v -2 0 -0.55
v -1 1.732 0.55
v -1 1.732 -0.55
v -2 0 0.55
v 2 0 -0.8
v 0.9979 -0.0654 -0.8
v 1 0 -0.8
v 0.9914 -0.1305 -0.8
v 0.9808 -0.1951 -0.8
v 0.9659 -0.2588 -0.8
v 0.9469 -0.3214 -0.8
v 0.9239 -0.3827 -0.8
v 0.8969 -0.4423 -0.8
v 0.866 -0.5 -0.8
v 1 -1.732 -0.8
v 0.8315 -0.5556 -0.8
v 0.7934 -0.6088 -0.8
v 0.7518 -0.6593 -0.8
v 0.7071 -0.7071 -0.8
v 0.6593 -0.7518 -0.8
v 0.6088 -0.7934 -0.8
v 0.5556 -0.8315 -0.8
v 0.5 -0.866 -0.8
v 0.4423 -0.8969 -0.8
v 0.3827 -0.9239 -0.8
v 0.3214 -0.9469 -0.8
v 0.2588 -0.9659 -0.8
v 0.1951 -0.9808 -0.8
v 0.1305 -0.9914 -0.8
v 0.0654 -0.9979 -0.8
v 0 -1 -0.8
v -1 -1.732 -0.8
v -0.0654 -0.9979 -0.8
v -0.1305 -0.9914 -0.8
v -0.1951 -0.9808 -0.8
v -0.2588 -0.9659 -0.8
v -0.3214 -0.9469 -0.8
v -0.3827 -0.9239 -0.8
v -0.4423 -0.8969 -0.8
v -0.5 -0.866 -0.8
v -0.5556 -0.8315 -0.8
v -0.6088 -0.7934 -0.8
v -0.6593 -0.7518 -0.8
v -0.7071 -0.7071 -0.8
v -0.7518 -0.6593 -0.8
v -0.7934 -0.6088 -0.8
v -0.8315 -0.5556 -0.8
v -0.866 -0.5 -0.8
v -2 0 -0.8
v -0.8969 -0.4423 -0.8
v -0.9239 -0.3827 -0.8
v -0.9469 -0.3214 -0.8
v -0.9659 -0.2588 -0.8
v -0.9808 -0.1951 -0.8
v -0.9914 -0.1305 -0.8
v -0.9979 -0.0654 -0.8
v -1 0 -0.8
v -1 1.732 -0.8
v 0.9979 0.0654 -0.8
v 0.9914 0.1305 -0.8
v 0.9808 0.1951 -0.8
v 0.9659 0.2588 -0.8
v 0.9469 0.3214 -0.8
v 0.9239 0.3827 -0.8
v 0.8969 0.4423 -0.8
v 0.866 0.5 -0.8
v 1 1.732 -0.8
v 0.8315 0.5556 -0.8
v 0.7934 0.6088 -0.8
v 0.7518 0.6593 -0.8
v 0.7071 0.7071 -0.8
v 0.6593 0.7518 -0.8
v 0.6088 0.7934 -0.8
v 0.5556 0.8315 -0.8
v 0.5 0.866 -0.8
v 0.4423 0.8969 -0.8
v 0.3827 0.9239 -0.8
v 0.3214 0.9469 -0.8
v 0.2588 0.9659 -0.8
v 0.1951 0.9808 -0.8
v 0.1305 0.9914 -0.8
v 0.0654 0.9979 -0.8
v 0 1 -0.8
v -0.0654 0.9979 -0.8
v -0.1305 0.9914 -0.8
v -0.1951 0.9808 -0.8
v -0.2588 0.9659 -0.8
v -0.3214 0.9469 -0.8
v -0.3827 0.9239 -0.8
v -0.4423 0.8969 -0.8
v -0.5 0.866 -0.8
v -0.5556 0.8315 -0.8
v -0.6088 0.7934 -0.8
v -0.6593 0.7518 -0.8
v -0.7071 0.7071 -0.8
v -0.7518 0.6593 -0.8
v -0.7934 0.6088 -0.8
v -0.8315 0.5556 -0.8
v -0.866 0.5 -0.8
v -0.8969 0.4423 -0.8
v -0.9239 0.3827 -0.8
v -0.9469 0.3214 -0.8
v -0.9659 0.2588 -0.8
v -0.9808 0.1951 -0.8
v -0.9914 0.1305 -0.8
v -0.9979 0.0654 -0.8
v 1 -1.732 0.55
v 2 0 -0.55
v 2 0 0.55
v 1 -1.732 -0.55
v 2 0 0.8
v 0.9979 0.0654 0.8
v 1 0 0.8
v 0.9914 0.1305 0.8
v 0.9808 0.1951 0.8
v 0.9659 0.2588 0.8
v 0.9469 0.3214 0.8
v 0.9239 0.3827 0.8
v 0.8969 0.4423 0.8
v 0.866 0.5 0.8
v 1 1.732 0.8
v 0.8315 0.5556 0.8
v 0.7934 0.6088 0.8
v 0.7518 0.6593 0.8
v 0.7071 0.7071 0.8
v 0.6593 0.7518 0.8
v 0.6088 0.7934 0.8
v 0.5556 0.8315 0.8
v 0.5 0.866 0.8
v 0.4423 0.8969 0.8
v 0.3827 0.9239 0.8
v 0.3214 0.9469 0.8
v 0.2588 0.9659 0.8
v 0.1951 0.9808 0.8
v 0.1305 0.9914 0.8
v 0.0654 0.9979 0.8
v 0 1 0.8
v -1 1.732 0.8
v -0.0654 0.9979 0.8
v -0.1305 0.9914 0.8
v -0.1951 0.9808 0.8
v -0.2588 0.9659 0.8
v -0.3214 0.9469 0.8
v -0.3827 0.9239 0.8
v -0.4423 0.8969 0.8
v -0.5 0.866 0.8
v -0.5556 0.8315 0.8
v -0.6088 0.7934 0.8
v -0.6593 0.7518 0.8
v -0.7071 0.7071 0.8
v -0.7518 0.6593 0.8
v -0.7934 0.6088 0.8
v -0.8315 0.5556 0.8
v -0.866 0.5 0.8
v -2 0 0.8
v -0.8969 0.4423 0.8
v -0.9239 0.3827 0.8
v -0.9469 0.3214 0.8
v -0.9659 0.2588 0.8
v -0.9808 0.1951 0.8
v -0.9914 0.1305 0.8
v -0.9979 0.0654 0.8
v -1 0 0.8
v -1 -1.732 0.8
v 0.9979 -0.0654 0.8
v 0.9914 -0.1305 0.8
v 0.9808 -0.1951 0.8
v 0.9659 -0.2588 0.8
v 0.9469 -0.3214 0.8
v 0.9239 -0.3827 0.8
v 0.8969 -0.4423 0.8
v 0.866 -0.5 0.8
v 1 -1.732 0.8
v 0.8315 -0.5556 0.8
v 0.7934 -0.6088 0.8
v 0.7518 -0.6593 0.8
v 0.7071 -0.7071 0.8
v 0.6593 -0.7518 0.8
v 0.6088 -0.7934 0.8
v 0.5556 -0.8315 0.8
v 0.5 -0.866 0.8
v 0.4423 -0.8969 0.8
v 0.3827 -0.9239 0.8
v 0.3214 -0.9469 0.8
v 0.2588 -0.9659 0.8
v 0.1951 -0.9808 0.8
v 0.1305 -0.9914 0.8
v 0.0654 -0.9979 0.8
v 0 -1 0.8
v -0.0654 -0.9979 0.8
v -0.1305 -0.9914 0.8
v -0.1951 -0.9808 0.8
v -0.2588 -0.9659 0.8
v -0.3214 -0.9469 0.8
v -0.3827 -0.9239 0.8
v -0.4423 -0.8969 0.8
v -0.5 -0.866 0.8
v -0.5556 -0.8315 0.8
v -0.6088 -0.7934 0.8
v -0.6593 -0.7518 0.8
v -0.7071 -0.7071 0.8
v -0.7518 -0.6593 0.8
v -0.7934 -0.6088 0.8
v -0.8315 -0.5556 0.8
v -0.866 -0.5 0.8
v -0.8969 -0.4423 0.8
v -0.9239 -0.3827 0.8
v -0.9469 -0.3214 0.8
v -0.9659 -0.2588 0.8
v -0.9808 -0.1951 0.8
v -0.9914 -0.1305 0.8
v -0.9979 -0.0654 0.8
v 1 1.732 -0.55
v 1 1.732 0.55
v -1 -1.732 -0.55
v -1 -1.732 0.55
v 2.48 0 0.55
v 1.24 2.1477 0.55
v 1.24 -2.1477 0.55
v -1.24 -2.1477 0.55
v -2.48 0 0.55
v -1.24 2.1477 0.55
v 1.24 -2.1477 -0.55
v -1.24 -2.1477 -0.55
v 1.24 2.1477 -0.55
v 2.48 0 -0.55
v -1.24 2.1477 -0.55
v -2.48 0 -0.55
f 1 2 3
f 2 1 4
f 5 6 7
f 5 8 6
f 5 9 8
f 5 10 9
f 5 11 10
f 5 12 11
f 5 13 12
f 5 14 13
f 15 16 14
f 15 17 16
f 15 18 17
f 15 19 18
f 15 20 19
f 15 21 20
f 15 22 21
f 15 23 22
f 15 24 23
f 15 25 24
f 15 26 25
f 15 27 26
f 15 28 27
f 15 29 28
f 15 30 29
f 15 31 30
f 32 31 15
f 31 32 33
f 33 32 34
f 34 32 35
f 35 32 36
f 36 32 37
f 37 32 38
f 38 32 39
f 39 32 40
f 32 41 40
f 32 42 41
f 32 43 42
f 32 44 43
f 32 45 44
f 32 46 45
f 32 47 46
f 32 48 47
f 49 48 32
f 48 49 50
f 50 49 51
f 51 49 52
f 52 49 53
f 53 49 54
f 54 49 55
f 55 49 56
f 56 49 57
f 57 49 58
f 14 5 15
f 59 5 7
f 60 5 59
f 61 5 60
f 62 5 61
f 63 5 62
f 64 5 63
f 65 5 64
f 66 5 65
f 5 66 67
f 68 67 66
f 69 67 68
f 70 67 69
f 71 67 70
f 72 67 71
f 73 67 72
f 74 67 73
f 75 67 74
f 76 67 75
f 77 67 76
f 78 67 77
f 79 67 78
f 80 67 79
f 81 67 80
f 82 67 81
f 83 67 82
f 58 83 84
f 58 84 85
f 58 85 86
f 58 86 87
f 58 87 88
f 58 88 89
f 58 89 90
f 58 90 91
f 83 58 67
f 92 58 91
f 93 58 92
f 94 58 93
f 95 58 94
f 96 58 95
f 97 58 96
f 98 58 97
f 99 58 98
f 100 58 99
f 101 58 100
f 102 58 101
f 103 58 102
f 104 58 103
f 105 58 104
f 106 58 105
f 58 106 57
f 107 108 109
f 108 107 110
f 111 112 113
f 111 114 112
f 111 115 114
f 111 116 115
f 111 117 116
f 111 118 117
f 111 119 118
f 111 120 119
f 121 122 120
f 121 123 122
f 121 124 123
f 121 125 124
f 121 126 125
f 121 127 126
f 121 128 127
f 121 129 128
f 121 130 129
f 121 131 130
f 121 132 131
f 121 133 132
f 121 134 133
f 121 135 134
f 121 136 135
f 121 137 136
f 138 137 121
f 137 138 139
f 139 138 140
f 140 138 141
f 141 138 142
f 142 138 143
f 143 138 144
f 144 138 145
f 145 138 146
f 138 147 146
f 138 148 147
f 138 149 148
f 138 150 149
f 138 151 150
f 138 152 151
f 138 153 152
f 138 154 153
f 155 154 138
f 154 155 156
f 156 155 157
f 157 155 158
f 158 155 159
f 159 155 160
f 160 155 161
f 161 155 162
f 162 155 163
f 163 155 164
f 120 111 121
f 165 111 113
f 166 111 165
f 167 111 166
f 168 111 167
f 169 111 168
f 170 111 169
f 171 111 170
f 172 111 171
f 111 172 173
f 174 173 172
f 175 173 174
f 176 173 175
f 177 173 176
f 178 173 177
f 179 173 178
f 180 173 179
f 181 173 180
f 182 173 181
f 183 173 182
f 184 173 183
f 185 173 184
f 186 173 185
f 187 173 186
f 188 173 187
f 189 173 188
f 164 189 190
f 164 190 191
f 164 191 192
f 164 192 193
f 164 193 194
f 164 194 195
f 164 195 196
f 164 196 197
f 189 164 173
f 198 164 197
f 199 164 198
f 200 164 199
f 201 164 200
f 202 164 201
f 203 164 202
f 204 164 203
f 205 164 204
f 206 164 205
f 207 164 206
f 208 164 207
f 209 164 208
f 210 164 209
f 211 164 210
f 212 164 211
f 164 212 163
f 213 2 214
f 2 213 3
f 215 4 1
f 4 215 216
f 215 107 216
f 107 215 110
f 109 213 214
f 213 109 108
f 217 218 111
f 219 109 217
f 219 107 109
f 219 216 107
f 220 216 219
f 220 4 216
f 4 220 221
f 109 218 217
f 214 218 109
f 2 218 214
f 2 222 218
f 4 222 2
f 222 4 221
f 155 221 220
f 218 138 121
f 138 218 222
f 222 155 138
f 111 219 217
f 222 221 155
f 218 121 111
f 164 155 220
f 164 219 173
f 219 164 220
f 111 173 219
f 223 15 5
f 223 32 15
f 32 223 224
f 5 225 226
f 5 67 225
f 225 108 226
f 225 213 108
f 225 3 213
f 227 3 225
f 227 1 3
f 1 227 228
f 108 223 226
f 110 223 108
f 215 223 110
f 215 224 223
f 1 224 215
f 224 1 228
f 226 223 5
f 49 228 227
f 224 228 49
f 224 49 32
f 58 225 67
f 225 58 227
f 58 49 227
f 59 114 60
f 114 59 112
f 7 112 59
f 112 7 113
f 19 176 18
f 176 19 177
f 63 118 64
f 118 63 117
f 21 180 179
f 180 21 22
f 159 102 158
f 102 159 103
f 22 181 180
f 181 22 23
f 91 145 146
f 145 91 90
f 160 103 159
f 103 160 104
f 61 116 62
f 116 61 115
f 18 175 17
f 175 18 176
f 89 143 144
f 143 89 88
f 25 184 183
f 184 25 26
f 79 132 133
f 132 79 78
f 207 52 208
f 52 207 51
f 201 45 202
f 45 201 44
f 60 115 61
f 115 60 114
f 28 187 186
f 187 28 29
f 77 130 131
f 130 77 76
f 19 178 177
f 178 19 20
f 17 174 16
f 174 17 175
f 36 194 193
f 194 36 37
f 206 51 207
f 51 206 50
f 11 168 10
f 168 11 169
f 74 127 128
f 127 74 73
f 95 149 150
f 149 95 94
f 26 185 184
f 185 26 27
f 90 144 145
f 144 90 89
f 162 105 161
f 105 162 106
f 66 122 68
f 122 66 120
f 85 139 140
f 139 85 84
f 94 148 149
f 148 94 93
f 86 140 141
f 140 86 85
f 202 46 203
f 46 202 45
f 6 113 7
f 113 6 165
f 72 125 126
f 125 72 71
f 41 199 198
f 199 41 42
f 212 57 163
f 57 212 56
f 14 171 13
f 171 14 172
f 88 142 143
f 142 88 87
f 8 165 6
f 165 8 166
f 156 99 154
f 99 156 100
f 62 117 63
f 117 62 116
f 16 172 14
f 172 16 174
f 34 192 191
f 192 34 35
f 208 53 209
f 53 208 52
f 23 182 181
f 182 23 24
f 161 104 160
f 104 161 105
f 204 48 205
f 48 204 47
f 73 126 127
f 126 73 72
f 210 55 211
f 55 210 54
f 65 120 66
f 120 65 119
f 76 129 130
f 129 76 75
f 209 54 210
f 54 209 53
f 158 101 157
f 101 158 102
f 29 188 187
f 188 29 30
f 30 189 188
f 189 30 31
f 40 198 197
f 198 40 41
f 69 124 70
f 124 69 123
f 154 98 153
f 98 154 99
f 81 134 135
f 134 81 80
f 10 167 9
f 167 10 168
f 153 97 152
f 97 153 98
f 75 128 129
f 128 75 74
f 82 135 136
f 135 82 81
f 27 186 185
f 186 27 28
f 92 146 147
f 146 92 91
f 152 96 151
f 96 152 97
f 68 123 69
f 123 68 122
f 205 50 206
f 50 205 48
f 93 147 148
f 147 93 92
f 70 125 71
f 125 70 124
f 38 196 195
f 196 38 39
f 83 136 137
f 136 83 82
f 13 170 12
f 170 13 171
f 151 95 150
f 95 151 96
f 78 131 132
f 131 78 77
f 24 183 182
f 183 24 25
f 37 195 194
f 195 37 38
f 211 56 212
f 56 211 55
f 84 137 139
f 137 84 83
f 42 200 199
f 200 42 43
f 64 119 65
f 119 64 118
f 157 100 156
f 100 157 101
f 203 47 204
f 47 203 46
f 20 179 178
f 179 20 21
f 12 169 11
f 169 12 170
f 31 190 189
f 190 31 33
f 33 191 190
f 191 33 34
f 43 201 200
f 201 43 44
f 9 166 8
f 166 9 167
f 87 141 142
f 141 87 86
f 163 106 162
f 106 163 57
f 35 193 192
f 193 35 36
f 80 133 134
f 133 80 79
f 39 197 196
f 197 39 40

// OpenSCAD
$fn = 96;

module hex_nut(thread_bore_d=2, thickness=1.6, across_flats=4.0, chamfer=0.25) {
    difference() {
        union() {
            // Main hex prism
            linear_extrude(height=thickness, center=true)
                circle(d=across_flats, $fn=6);

            // Small chamfers on both faces (approx)
            translate([0,0, thickness/2 - chamfer/2])
                cylinder(h=chamfer, r1=across_flats*0.62, r2=across_flats*0.50, center=true, $fn=6);
            translate([0,0,-thickness/2 + chamfer/2])
                cylinder(h=chamfer, r1=across_flats*0.50, r2=across_flats*0.62, center=true, $fn=6);
        }

        // Thread bore (modeled as plain cylindrical hole)
        cylinder(h=thickness + 2, d=thread_bore_d, center=true);
    }
}

hex_nut(thread_bore_d=2, thickness=1.6);
